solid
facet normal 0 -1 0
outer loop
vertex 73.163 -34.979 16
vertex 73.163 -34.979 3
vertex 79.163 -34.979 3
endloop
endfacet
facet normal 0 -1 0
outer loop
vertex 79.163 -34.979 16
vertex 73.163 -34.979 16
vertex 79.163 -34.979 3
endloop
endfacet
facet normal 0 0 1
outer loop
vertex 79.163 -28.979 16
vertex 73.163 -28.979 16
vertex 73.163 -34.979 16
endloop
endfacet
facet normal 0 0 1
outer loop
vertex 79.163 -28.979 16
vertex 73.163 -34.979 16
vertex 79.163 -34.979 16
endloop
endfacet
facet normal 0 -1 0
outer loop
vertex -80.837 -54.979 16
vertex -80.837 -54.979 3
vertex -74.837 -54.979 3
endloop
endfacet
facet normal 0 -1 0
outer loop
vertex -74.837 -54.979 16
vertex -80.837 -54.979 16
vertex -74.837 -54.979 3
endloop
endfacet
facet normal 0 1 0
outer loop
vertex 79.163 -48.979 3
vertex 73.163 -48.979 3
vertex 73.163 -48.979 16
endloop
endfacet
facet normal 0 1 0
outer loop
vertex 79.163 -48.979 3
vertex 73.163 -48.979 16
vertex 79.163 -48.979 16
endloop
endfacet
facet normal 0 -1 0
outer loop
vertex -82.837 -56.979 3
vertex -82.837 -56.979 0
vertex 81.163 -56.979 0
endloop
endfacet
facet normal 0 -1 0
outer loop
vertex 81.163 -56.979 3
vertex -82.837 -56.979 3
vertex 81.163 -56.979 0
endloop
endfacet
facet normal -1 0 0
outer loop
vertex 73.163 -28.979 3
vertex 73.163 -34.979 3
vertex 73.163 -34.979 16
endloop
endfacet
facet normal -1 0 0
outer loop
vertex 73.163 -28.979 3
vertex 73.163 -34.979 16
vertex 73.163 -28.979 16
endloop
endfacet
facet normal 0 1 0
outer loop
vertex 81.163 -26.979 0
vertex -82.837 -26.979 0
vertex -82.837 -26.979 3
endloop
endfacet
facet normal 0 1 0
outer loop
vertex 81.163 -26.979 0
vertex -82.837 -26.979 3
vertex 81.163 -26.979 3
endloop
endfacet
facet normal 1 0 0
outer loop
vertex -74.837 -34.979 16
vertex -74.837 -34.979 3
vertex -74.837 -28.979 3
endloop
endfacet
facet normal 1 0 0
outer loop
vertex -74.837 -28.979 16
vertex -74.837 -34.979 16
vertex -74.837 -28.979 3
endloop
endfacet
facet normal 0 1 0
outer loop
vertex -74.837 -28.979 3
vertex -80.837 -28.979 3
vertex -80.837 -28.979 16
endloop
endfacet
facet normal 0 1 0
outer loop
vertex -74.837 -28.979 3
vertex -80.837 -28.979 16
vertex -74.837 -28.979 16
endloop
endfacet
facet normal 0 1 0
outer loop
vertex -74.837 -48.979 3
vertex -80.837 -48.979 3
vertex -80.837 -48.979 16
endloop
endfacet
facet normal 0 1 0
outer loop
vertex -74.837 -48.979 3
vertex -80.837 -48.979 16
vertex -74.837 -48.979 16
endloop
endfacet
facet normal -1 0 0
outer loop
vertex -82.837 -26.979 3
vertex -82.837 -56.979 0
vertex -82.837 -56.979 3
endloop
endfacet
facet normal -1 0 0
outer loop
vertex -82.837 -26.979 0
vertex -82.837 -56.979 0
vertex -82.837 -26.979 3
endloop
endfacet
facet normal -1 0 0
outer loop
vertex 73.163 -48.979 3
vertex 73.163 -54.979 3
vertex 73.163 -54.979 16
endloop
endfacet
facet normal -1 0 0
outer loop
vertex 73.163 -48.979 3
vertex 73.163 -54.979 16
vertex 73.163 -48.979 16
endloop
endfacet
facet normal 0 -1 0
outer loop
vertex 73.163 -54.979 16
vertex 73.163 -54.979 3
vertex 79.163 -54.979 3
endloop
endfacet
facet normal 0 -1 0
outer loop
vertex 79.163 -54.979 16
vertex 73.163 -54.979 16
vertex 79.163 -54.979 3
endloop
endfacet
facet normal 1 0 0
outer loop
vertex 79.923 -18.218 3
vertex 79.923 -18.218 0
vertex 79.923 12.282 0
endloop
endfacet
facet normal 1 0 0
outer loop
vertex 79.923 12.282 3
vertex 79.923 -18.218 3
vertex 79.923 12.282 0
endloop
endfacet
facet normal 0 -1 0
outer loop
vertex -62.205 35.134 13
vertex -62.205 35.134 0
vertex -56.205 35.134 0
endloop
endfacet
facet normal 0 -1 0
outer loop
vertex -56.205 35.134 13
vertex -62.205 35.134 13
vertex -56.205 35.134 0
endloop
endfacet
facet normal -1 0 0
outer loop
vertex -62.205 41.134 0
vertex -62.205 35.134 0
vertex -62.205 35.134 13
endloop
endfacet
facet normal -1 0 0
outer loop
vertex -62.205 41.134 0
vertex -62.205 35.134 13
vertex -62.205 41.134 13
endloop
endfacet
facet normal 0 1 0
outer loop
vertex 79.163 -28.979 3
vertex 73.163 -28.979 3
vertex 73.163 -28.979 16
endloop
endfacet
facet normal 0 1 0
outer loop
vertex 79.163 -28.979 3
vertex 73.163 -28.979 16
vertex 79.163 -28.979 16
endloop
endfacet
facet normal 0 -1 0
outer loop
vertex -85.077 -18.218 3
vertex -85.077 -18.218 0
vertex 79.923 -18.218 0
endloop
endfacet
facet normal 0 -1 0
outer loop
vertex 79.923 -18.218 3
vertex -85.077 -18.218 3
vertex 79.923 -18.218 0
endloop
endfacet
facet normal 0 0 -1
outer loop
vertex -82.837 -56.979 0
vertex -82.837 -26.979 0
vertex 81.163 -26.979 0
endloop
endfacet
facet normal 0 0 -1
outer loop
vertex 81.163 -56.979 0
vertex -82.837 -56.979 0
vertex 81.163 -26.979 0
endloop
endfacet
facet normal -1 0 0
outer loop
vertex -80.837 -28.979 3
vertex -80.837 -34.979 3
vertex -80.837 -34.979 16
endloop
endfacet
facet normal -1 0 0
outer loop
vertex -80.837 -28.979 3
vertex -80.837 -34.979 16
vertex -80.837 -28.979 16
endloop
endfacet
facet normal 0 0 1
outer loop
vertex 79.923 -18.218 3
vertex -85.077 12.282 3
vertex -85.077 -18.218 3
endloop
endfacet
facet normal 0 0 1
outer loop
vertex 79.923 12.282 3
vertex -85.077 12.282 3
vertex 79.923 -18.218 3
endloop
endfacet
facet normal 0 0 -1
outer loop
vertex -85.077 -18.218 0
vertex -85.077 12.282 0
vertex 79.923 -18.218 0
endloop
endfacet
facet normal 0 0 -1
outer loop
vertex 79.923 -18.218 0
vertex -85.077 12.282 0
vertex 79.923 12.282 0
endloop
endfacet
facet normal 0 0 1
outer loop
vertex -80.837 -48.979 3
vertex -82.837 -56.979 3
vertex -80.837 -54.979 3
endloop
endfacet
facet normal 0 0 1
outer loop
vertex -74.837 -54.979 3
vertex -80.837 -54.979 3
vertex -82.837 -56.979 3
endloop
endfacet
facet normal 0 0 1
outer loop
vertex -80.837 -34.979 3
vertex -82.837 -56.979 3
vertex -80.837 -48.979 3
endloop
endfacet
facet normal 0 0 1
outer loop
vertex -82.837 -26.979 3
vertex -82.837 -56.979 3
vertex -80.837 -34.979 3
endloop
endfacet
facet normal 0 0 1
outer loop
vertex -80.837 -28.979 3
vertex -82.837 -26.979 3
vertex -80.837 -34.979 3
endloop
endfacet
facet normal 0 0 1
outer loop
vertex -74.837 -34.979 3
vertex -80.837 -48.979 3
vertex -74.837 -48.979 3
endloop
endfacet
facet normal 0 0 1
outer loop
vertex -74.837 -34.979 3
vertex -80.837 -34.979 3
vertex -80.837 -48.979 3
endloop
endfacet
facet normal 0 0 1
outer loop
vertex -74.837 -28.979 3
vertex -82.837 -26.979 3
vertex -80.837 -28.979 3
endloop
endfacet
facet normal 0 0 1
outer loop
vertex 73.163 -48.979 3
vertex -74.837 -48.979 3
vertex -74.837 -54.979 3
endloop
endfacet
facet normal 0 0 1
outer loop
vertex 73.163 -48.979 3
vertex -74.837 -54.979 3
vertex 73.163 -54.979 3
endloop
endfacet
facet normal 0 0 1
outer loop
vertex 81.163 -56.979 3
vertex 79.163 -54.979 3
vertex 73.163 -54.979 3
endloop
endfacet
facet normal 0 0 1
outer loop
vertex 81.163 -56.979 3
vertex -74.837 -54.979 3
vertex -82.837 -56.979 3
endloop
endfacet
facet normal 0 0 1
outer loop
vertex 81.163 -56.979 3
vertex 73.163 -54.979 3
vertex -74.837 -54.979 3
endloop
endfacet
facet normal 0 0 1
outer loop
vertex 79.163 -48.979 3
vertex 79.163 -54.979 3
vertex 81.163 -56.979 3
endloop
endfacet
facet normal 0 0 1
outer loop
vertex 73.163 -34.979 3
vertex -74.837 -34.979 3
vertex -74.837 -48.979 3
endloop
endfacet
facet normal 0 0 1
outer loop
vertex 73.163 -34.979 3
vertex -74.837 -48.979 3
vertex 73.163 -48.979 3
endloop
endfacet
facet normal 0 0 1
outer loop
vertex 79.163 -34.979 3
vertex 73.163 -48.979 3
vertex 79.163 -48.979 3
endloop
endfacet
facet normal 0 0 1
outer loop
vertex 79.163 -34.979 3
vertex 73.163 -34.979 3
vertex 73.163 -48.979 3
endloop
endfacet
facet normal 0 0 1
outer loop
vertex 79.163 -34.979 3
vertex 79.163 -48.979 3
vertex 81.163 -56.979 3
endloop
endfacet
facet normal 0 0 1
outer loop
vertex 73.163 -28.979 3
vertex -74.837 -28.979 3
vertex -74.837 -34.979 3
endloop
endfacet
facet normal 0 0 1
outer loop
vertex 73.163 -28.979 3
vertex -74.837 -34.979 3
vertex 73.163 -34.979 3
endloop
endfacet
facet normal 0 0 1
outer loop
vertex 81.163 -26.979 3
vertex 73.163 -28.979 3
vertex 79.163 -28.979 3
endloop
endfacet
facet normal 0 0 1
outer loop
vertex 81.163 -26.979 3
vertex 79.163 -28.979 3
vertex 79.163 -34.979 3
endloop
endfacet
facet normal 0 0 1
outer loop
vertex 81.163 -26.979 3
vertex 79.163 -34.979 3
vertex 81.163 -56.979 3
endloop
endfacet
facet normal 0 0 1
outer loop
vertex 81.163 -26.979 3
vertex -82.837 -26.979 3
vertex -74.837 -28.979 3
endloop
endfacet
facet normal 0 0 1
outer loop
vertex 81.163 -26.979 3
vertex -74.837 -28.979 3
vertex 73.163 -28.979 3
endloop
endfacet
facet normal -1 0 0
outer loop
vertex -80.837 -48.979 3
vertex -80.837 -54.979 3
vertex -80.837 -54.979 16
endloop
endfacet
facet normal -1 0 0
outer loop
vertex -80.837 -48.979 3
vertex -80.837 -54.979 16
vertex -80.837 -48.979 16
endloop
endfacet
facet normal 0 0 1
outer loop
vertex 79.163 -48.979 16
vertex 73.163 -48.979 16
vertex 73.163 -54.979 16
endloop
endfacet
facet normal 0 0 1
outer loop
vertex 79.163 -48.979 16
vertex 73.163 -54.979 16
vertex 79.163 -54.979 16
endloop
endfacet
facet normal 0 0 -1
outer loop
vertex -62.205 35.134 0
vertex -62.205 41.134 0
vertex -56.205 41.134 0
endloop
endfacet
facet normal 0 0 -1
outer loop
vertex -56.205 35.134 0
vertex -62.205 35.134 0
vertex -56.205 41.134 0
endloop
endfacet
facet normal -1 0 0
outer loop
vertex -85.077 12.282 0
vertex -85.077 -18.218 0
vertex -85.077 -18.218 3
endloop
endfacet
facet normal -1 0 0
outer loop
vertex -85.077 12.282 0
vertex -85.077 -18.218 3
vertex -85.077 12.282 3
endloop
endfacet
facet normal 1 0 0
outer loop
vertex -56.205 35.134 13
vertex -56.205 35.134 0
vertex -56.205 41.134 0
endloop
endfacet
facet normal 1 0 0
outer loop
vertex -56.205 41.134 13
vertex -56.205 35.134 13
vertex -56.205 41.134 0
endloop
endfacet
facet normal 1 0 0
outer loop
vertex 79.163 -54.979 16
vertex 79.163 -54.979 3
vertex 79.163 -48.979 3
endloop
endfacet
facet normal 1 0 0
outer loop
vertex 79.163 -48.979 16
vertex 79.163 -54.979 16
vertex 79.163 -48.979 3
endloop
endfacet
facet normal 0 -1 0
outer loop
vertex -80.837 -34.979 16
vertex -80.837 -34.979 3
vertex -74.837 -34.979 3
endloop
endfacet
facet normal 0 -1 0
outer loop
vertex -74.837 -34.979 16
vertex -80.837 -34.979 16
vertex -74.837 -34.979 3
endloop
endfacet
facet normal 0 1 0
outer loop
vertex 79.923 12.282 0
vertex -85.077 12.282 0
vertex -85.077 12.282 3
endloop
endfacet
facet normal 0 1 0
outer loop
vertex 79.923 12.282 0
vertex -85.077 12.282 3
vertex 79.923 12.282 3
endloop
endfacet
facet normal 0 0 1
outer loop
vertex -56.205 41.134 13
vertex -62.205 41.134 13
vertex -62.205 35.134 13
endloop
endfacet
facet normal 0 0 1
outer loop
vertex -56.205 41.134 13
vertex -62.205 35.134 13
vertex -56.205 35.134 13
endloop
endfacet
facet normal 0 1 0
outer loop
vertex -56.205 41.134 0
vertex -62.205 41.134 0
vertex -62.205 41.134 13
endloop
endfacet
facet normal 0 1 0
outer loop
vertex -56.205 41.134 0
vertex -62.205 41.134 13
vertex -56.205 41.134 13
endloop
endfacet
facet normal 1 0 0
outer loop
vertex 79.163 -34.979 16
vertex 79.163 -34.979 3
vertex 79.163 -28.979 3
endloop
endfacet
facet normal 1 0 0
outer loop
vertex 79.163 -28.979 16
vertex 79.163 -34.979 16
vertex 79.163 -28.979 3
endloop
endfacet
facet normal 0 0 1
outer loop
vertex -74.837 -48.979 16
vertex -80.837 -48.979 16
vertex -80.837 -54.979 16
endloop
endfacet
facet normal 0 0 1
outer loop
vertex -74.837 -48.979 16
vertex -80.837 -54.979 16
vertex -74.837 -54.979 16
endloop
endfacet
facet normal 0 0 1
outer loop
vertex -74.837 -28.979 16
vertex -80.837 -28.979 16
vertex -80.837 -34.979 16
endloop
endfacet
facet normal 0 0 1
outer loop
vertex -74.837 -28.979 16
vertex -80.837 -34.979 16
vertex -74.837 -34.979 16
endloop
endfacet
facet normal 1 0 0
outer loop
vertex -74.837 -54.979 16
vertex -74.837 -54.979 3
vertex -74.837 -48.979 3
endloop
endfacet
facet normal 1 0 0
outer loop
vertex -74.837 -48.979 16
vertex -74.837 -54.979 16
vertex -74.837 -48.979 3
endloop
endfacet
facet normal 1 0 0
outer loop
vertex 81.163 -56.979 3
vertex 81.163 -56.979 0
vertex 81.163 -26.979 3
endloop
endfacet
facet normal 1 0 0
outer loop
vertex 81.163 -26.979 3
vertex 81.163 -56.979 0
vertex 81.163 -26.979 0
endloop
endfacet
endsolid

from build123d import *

# Parameters (mm, degrees)
F0_W     = 165
F0_H     = 30.5
F2_DEPTH = 3
F1_W     = 6
F1_H     = 6
F3_DEPTH = 13
F4_W     = 164
F4_H     = 30
F4_W_2   = 6
F4_H_2   = 6
F5_DEPTH = 3
F6_DEPTH = 16


with BuildPart() as f2:
    # F0 (on Top) → F2 (new body)
    with BuildSketch(Plane.XY):
        with Locations((-2.576933, -2.968113)):
            Rectangle(F0_W, F0_H)
    extrude(amount=F2_DEPTH)


with BuildPart() as f3:
    # F1 (on Top) → F3 (new body)
    with BuildSketch(Plane.XY):
        with Locations((-59.204874, 38.1338)):
            Rectangle(F1_W, F1_H)
    extrude(amount=F3_DEPTH)


with BuildPart() as f5:
    # F4 (on Top) → F5 (new body)
    with BuildSketch(Plane.XY):
        with Locations((-0.836897, -41.978834)):
            Rectangle(F4_W, F4_H)
        with Locations((-77.836897, -51.978834)):
            Rectangle(F4_W_2, F4_H_2, mode=Mode.SUBTRACT)
        with Locations((76.163103, -51.978834)):
            Rectangle(F4_W_2, F4_H_2, mode=Mode.SUBTRACT)
        with Locations((-77.836897, -31.978834)):
            Rectangle(F4_W_2, F4_H_2, mode=Mode.SUBTRACT)
        with Locations((76.163103, -31.978834)):
            Rectangle(F4_W_2, F4_H_2, mode=Mode.SUBTRACT)
    extrude(amount=F5_DEPTH)

    # F4 (on Top) → F6 (join)
    with BuildSketch(Plane.XY):
        with Locations((-77.836897, -31.978834)):
            Rectangle(F4_W_2, F4_H_2)
        with Locations((-77.836897, -51.978834)):
            Rectangle(F4_W_2, F4_H_2)
        with Locations((76.163103, -31.978834)):
            Rectangle(F4_W_2, F4_H_2)
        with Locations((76.163103, -51.978834)):
            Rectangle(F4_W_2, F4_H_2)
    extrude(amount=F6_DEPTH)


solid = Compound([f2.part, f3.part, f5.part])
